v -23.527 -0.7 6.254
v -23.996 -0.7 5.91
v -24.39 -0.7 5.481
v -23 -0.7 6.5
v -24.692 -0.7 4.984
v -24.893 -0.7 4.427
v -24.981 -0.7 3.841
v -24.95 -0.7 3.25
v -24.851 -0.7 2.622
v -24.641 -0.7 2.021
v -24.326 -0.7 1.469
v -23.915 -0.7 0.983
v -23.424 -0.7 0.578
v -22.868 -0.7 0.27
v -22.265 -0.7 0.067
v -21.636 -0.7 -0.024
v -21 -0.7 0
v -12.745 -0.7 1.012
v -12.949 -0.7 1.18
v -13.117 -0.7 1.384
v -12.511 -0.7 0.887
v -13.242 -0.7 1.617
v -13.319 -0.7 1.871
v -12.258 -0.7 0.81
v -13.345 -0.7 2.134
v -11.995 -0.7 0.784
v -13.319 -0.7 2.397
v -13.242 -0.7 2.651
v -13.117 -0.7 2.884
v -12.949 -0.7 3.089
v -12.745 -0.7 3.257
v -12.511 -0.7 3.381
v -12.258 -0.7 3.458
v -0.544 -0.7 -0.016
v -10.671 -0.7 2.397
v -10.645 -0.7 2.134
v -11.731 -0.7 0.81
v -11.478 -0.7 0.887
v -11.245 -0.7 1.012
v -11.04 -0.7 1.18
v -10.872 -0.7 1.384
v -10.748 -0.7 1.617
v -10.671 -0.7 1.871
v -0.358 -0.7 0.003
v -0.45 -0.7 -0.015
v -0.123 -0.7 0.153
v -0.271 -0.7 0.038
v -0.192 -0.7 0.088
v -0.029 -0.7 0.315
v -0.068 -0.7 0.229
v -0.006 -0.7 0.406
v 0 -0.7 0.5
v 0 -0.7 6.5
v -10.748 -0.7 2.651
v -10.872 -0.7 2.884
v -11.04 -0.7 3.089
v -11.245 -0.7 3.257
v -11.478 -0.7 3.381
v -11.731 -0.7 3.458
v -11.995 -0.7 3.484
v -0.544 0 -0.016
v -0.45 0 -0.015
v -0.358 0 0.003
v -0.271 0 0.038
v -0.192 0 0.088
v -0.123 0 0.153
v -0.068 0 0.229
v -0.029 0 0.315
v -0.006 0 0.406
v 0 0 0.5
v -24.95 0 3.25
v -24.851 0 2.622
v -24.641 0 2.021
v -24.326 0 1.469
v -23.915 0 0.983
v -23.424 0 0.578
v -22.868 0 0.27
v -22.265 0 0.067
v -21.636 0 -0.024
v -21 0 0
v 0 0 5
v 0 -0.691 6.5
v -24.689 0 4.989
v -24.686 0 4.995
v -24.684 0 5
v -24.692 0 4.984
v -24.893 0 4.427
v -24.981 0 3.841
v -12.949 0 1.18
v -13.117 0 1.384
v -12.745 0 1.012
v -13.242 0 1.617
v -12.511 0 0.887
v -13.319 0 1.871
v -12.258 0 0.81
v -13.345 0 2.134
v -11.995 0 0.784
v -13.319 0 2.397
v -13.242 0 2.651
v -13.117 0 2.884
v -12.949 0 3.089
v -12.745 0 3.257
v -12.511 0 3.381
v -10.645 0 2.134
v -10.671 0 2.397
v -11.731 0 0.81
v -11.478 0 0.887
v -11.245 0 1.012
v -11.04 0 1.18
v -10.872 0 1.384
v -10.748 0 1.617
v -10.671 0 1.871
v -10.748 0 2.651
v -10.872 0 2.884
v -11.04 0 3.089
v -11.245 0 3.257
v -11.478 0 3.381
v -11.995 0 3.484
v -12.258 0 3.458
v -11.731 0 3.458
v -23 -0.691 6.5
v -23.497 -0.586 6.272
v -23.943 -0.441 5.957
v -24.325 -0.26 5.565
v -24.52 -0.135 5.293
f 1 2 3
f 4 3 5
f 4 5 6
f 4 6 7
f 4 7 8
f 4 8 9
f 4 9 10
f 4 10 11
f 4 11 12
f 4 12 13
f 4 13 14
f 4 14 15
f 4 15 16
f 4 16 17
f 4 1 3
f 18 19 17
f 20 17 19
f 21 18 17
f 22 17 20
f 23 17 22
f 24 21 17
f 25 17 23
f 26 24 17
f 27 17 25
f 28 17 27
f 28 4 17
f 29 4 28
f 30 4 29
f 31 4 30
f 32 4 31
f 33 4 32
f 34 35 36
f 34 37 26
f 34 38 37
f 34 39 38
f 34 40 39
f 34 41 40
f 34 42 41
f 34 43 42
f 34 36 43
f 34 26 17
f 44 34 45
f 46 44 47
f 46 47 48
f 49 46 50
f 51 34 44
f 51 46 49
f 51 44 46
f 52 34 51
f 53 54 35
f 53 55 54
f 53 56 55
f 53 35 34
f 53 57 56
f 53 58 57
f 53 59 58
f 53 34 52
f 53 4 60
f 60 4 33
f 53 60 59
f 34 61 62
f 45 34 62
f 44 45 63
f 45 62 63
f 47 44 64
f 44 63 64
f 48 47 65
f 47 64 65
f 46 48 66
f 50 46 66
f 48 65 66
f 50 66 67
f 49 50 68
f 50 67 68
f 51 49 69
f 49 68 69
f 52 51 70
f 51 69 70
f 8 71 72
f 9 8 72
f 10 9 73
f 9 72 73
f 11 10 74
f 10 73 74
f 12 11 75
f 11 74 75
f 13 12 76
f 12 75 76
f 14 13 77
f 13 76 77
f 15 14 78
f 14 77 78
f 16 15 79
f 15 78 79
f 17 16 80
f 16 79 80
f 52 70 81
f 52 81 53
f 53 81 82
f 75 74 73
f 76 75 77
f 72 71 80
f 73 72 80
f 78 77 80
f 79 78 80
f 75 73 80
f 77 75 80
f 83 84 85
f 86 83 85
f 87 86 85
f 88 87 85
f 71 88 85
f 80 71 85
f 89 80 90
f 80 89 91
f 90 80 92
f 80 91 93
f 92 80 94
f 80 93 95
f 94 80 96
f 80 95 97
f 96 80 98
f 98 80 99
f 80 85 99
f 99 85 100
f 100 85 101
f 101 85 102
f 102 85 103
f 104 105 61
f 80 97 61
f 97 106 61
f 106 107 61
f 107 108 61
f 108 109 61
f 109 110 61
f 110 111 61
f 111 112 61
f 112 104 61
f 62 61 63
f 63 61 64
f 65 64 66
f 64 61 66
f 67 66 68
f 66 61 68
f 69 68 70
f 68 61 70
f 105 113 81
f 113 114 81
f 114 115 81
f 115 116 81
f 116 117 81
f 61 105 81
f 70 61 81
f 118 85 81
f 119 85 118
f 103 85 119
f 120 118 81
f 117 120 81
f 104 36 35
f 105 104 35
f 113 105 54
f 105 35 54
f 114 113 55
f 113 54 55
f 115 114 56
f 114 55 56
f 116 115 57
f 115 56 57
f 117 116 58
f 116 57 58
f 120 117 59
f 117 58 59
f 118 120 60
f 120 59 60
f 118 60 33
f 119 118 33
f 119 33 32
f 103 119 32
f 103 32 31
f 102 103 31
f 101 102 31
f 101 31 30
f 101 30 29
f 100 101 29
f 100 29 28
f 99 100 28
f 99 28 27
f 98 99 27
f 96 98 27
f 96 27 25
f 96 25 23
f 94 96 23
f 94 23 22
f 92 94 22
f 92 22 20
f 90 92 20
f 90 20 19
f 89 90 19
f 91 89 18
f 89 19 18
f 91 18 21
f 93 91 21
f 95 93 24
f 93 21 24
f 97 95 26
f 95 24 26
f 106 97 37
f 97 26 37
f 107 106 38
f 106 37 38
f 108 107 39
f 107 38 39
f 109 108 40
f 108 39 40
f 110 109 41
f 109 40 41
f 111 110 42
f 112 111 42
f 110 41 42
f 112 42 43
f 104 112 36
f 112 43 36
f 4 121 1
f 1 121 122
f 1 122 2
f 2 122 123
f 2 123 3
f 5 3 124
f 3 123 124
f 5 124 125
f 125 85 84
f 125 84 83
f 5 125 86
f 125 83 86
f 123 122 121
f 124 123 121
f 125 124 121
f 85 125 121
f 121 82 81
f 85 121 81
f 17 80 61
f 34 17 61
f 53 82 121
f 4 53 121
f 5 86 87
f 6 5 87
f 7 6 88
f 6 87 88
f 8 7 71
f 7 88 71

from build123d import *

# Parameters (mm, degrees)
F0_R     = 1.35
F1_DEPTH = 0.7
F2_R     = 1.35
F3_DEPTH = 25
F5_DEPTH = 25


with BuildPart() as f1:
    # F0 (on Front) → F1 (new body)
    with BuildSketch(Plane.XZ):
        with BuildLine():
            Line((-21, 0), (-0.5443152335, -0.0158934575))
            ThreePointArc((-0.5443152335, -0.0158934575), (-0.1558427945, 0.1191114487), (0, 0.499703335))
            Line((0, 0.499703335), (0, 4.9841065425))
            Line((0, 4.9841065425), (-24.6915577171, 4.9841065425))
            ThreePointArc((-24.6915577171, 4.9841065425), (-24.951684375, 4.1365627533), (-24.95, 3.25))
            ThreePointArc((-24.95, 3.25), (-23.6789862708, 0.769385917), (-21, 0))
        make_face()
        with Locations((-12.475, 2.15)):
            Circle(F0_R, mode=Mode.SUBTRACT)
        with BuildLine():
            Line((-24.6915577171, 4.9841065425), (0, 4.9841065425))
            Line((0, 4.9841065425), (0, 6.5))
            Line((0, 6.5), (-23, 6.5))
            ThreePointArc((-23, 6.5), (-23.9964550111, 5.9101900274), (-24.6915577171, 4.9841065425))
        make_face()
        with Locations((-12.475, 2.15)):
            Circle(F0_R)
    extrude(amount=F1_DEPTH)

    # F2 (on face) → F3 (cut)
    with BuildSketch(Plane.XZ.offset(0.7)):
        with Locations((-11.9948536158, 2.1341065425)):
            Circle(F2_R)
    extrude(amount=-F3_DEPTH, mode=Mode.SUBTRACT)

    # F4 (on Right) → F5 (cut)
    with BuildSketch(Plane.YZ):
        Polygon((-0.7018046454, 6.5234168433), (0, 5), (0, 6.521099247), align=None)
    extrude(amount=-F5_DEPTH, mode=Mode.SUBTRACT)


solid = f1.part
